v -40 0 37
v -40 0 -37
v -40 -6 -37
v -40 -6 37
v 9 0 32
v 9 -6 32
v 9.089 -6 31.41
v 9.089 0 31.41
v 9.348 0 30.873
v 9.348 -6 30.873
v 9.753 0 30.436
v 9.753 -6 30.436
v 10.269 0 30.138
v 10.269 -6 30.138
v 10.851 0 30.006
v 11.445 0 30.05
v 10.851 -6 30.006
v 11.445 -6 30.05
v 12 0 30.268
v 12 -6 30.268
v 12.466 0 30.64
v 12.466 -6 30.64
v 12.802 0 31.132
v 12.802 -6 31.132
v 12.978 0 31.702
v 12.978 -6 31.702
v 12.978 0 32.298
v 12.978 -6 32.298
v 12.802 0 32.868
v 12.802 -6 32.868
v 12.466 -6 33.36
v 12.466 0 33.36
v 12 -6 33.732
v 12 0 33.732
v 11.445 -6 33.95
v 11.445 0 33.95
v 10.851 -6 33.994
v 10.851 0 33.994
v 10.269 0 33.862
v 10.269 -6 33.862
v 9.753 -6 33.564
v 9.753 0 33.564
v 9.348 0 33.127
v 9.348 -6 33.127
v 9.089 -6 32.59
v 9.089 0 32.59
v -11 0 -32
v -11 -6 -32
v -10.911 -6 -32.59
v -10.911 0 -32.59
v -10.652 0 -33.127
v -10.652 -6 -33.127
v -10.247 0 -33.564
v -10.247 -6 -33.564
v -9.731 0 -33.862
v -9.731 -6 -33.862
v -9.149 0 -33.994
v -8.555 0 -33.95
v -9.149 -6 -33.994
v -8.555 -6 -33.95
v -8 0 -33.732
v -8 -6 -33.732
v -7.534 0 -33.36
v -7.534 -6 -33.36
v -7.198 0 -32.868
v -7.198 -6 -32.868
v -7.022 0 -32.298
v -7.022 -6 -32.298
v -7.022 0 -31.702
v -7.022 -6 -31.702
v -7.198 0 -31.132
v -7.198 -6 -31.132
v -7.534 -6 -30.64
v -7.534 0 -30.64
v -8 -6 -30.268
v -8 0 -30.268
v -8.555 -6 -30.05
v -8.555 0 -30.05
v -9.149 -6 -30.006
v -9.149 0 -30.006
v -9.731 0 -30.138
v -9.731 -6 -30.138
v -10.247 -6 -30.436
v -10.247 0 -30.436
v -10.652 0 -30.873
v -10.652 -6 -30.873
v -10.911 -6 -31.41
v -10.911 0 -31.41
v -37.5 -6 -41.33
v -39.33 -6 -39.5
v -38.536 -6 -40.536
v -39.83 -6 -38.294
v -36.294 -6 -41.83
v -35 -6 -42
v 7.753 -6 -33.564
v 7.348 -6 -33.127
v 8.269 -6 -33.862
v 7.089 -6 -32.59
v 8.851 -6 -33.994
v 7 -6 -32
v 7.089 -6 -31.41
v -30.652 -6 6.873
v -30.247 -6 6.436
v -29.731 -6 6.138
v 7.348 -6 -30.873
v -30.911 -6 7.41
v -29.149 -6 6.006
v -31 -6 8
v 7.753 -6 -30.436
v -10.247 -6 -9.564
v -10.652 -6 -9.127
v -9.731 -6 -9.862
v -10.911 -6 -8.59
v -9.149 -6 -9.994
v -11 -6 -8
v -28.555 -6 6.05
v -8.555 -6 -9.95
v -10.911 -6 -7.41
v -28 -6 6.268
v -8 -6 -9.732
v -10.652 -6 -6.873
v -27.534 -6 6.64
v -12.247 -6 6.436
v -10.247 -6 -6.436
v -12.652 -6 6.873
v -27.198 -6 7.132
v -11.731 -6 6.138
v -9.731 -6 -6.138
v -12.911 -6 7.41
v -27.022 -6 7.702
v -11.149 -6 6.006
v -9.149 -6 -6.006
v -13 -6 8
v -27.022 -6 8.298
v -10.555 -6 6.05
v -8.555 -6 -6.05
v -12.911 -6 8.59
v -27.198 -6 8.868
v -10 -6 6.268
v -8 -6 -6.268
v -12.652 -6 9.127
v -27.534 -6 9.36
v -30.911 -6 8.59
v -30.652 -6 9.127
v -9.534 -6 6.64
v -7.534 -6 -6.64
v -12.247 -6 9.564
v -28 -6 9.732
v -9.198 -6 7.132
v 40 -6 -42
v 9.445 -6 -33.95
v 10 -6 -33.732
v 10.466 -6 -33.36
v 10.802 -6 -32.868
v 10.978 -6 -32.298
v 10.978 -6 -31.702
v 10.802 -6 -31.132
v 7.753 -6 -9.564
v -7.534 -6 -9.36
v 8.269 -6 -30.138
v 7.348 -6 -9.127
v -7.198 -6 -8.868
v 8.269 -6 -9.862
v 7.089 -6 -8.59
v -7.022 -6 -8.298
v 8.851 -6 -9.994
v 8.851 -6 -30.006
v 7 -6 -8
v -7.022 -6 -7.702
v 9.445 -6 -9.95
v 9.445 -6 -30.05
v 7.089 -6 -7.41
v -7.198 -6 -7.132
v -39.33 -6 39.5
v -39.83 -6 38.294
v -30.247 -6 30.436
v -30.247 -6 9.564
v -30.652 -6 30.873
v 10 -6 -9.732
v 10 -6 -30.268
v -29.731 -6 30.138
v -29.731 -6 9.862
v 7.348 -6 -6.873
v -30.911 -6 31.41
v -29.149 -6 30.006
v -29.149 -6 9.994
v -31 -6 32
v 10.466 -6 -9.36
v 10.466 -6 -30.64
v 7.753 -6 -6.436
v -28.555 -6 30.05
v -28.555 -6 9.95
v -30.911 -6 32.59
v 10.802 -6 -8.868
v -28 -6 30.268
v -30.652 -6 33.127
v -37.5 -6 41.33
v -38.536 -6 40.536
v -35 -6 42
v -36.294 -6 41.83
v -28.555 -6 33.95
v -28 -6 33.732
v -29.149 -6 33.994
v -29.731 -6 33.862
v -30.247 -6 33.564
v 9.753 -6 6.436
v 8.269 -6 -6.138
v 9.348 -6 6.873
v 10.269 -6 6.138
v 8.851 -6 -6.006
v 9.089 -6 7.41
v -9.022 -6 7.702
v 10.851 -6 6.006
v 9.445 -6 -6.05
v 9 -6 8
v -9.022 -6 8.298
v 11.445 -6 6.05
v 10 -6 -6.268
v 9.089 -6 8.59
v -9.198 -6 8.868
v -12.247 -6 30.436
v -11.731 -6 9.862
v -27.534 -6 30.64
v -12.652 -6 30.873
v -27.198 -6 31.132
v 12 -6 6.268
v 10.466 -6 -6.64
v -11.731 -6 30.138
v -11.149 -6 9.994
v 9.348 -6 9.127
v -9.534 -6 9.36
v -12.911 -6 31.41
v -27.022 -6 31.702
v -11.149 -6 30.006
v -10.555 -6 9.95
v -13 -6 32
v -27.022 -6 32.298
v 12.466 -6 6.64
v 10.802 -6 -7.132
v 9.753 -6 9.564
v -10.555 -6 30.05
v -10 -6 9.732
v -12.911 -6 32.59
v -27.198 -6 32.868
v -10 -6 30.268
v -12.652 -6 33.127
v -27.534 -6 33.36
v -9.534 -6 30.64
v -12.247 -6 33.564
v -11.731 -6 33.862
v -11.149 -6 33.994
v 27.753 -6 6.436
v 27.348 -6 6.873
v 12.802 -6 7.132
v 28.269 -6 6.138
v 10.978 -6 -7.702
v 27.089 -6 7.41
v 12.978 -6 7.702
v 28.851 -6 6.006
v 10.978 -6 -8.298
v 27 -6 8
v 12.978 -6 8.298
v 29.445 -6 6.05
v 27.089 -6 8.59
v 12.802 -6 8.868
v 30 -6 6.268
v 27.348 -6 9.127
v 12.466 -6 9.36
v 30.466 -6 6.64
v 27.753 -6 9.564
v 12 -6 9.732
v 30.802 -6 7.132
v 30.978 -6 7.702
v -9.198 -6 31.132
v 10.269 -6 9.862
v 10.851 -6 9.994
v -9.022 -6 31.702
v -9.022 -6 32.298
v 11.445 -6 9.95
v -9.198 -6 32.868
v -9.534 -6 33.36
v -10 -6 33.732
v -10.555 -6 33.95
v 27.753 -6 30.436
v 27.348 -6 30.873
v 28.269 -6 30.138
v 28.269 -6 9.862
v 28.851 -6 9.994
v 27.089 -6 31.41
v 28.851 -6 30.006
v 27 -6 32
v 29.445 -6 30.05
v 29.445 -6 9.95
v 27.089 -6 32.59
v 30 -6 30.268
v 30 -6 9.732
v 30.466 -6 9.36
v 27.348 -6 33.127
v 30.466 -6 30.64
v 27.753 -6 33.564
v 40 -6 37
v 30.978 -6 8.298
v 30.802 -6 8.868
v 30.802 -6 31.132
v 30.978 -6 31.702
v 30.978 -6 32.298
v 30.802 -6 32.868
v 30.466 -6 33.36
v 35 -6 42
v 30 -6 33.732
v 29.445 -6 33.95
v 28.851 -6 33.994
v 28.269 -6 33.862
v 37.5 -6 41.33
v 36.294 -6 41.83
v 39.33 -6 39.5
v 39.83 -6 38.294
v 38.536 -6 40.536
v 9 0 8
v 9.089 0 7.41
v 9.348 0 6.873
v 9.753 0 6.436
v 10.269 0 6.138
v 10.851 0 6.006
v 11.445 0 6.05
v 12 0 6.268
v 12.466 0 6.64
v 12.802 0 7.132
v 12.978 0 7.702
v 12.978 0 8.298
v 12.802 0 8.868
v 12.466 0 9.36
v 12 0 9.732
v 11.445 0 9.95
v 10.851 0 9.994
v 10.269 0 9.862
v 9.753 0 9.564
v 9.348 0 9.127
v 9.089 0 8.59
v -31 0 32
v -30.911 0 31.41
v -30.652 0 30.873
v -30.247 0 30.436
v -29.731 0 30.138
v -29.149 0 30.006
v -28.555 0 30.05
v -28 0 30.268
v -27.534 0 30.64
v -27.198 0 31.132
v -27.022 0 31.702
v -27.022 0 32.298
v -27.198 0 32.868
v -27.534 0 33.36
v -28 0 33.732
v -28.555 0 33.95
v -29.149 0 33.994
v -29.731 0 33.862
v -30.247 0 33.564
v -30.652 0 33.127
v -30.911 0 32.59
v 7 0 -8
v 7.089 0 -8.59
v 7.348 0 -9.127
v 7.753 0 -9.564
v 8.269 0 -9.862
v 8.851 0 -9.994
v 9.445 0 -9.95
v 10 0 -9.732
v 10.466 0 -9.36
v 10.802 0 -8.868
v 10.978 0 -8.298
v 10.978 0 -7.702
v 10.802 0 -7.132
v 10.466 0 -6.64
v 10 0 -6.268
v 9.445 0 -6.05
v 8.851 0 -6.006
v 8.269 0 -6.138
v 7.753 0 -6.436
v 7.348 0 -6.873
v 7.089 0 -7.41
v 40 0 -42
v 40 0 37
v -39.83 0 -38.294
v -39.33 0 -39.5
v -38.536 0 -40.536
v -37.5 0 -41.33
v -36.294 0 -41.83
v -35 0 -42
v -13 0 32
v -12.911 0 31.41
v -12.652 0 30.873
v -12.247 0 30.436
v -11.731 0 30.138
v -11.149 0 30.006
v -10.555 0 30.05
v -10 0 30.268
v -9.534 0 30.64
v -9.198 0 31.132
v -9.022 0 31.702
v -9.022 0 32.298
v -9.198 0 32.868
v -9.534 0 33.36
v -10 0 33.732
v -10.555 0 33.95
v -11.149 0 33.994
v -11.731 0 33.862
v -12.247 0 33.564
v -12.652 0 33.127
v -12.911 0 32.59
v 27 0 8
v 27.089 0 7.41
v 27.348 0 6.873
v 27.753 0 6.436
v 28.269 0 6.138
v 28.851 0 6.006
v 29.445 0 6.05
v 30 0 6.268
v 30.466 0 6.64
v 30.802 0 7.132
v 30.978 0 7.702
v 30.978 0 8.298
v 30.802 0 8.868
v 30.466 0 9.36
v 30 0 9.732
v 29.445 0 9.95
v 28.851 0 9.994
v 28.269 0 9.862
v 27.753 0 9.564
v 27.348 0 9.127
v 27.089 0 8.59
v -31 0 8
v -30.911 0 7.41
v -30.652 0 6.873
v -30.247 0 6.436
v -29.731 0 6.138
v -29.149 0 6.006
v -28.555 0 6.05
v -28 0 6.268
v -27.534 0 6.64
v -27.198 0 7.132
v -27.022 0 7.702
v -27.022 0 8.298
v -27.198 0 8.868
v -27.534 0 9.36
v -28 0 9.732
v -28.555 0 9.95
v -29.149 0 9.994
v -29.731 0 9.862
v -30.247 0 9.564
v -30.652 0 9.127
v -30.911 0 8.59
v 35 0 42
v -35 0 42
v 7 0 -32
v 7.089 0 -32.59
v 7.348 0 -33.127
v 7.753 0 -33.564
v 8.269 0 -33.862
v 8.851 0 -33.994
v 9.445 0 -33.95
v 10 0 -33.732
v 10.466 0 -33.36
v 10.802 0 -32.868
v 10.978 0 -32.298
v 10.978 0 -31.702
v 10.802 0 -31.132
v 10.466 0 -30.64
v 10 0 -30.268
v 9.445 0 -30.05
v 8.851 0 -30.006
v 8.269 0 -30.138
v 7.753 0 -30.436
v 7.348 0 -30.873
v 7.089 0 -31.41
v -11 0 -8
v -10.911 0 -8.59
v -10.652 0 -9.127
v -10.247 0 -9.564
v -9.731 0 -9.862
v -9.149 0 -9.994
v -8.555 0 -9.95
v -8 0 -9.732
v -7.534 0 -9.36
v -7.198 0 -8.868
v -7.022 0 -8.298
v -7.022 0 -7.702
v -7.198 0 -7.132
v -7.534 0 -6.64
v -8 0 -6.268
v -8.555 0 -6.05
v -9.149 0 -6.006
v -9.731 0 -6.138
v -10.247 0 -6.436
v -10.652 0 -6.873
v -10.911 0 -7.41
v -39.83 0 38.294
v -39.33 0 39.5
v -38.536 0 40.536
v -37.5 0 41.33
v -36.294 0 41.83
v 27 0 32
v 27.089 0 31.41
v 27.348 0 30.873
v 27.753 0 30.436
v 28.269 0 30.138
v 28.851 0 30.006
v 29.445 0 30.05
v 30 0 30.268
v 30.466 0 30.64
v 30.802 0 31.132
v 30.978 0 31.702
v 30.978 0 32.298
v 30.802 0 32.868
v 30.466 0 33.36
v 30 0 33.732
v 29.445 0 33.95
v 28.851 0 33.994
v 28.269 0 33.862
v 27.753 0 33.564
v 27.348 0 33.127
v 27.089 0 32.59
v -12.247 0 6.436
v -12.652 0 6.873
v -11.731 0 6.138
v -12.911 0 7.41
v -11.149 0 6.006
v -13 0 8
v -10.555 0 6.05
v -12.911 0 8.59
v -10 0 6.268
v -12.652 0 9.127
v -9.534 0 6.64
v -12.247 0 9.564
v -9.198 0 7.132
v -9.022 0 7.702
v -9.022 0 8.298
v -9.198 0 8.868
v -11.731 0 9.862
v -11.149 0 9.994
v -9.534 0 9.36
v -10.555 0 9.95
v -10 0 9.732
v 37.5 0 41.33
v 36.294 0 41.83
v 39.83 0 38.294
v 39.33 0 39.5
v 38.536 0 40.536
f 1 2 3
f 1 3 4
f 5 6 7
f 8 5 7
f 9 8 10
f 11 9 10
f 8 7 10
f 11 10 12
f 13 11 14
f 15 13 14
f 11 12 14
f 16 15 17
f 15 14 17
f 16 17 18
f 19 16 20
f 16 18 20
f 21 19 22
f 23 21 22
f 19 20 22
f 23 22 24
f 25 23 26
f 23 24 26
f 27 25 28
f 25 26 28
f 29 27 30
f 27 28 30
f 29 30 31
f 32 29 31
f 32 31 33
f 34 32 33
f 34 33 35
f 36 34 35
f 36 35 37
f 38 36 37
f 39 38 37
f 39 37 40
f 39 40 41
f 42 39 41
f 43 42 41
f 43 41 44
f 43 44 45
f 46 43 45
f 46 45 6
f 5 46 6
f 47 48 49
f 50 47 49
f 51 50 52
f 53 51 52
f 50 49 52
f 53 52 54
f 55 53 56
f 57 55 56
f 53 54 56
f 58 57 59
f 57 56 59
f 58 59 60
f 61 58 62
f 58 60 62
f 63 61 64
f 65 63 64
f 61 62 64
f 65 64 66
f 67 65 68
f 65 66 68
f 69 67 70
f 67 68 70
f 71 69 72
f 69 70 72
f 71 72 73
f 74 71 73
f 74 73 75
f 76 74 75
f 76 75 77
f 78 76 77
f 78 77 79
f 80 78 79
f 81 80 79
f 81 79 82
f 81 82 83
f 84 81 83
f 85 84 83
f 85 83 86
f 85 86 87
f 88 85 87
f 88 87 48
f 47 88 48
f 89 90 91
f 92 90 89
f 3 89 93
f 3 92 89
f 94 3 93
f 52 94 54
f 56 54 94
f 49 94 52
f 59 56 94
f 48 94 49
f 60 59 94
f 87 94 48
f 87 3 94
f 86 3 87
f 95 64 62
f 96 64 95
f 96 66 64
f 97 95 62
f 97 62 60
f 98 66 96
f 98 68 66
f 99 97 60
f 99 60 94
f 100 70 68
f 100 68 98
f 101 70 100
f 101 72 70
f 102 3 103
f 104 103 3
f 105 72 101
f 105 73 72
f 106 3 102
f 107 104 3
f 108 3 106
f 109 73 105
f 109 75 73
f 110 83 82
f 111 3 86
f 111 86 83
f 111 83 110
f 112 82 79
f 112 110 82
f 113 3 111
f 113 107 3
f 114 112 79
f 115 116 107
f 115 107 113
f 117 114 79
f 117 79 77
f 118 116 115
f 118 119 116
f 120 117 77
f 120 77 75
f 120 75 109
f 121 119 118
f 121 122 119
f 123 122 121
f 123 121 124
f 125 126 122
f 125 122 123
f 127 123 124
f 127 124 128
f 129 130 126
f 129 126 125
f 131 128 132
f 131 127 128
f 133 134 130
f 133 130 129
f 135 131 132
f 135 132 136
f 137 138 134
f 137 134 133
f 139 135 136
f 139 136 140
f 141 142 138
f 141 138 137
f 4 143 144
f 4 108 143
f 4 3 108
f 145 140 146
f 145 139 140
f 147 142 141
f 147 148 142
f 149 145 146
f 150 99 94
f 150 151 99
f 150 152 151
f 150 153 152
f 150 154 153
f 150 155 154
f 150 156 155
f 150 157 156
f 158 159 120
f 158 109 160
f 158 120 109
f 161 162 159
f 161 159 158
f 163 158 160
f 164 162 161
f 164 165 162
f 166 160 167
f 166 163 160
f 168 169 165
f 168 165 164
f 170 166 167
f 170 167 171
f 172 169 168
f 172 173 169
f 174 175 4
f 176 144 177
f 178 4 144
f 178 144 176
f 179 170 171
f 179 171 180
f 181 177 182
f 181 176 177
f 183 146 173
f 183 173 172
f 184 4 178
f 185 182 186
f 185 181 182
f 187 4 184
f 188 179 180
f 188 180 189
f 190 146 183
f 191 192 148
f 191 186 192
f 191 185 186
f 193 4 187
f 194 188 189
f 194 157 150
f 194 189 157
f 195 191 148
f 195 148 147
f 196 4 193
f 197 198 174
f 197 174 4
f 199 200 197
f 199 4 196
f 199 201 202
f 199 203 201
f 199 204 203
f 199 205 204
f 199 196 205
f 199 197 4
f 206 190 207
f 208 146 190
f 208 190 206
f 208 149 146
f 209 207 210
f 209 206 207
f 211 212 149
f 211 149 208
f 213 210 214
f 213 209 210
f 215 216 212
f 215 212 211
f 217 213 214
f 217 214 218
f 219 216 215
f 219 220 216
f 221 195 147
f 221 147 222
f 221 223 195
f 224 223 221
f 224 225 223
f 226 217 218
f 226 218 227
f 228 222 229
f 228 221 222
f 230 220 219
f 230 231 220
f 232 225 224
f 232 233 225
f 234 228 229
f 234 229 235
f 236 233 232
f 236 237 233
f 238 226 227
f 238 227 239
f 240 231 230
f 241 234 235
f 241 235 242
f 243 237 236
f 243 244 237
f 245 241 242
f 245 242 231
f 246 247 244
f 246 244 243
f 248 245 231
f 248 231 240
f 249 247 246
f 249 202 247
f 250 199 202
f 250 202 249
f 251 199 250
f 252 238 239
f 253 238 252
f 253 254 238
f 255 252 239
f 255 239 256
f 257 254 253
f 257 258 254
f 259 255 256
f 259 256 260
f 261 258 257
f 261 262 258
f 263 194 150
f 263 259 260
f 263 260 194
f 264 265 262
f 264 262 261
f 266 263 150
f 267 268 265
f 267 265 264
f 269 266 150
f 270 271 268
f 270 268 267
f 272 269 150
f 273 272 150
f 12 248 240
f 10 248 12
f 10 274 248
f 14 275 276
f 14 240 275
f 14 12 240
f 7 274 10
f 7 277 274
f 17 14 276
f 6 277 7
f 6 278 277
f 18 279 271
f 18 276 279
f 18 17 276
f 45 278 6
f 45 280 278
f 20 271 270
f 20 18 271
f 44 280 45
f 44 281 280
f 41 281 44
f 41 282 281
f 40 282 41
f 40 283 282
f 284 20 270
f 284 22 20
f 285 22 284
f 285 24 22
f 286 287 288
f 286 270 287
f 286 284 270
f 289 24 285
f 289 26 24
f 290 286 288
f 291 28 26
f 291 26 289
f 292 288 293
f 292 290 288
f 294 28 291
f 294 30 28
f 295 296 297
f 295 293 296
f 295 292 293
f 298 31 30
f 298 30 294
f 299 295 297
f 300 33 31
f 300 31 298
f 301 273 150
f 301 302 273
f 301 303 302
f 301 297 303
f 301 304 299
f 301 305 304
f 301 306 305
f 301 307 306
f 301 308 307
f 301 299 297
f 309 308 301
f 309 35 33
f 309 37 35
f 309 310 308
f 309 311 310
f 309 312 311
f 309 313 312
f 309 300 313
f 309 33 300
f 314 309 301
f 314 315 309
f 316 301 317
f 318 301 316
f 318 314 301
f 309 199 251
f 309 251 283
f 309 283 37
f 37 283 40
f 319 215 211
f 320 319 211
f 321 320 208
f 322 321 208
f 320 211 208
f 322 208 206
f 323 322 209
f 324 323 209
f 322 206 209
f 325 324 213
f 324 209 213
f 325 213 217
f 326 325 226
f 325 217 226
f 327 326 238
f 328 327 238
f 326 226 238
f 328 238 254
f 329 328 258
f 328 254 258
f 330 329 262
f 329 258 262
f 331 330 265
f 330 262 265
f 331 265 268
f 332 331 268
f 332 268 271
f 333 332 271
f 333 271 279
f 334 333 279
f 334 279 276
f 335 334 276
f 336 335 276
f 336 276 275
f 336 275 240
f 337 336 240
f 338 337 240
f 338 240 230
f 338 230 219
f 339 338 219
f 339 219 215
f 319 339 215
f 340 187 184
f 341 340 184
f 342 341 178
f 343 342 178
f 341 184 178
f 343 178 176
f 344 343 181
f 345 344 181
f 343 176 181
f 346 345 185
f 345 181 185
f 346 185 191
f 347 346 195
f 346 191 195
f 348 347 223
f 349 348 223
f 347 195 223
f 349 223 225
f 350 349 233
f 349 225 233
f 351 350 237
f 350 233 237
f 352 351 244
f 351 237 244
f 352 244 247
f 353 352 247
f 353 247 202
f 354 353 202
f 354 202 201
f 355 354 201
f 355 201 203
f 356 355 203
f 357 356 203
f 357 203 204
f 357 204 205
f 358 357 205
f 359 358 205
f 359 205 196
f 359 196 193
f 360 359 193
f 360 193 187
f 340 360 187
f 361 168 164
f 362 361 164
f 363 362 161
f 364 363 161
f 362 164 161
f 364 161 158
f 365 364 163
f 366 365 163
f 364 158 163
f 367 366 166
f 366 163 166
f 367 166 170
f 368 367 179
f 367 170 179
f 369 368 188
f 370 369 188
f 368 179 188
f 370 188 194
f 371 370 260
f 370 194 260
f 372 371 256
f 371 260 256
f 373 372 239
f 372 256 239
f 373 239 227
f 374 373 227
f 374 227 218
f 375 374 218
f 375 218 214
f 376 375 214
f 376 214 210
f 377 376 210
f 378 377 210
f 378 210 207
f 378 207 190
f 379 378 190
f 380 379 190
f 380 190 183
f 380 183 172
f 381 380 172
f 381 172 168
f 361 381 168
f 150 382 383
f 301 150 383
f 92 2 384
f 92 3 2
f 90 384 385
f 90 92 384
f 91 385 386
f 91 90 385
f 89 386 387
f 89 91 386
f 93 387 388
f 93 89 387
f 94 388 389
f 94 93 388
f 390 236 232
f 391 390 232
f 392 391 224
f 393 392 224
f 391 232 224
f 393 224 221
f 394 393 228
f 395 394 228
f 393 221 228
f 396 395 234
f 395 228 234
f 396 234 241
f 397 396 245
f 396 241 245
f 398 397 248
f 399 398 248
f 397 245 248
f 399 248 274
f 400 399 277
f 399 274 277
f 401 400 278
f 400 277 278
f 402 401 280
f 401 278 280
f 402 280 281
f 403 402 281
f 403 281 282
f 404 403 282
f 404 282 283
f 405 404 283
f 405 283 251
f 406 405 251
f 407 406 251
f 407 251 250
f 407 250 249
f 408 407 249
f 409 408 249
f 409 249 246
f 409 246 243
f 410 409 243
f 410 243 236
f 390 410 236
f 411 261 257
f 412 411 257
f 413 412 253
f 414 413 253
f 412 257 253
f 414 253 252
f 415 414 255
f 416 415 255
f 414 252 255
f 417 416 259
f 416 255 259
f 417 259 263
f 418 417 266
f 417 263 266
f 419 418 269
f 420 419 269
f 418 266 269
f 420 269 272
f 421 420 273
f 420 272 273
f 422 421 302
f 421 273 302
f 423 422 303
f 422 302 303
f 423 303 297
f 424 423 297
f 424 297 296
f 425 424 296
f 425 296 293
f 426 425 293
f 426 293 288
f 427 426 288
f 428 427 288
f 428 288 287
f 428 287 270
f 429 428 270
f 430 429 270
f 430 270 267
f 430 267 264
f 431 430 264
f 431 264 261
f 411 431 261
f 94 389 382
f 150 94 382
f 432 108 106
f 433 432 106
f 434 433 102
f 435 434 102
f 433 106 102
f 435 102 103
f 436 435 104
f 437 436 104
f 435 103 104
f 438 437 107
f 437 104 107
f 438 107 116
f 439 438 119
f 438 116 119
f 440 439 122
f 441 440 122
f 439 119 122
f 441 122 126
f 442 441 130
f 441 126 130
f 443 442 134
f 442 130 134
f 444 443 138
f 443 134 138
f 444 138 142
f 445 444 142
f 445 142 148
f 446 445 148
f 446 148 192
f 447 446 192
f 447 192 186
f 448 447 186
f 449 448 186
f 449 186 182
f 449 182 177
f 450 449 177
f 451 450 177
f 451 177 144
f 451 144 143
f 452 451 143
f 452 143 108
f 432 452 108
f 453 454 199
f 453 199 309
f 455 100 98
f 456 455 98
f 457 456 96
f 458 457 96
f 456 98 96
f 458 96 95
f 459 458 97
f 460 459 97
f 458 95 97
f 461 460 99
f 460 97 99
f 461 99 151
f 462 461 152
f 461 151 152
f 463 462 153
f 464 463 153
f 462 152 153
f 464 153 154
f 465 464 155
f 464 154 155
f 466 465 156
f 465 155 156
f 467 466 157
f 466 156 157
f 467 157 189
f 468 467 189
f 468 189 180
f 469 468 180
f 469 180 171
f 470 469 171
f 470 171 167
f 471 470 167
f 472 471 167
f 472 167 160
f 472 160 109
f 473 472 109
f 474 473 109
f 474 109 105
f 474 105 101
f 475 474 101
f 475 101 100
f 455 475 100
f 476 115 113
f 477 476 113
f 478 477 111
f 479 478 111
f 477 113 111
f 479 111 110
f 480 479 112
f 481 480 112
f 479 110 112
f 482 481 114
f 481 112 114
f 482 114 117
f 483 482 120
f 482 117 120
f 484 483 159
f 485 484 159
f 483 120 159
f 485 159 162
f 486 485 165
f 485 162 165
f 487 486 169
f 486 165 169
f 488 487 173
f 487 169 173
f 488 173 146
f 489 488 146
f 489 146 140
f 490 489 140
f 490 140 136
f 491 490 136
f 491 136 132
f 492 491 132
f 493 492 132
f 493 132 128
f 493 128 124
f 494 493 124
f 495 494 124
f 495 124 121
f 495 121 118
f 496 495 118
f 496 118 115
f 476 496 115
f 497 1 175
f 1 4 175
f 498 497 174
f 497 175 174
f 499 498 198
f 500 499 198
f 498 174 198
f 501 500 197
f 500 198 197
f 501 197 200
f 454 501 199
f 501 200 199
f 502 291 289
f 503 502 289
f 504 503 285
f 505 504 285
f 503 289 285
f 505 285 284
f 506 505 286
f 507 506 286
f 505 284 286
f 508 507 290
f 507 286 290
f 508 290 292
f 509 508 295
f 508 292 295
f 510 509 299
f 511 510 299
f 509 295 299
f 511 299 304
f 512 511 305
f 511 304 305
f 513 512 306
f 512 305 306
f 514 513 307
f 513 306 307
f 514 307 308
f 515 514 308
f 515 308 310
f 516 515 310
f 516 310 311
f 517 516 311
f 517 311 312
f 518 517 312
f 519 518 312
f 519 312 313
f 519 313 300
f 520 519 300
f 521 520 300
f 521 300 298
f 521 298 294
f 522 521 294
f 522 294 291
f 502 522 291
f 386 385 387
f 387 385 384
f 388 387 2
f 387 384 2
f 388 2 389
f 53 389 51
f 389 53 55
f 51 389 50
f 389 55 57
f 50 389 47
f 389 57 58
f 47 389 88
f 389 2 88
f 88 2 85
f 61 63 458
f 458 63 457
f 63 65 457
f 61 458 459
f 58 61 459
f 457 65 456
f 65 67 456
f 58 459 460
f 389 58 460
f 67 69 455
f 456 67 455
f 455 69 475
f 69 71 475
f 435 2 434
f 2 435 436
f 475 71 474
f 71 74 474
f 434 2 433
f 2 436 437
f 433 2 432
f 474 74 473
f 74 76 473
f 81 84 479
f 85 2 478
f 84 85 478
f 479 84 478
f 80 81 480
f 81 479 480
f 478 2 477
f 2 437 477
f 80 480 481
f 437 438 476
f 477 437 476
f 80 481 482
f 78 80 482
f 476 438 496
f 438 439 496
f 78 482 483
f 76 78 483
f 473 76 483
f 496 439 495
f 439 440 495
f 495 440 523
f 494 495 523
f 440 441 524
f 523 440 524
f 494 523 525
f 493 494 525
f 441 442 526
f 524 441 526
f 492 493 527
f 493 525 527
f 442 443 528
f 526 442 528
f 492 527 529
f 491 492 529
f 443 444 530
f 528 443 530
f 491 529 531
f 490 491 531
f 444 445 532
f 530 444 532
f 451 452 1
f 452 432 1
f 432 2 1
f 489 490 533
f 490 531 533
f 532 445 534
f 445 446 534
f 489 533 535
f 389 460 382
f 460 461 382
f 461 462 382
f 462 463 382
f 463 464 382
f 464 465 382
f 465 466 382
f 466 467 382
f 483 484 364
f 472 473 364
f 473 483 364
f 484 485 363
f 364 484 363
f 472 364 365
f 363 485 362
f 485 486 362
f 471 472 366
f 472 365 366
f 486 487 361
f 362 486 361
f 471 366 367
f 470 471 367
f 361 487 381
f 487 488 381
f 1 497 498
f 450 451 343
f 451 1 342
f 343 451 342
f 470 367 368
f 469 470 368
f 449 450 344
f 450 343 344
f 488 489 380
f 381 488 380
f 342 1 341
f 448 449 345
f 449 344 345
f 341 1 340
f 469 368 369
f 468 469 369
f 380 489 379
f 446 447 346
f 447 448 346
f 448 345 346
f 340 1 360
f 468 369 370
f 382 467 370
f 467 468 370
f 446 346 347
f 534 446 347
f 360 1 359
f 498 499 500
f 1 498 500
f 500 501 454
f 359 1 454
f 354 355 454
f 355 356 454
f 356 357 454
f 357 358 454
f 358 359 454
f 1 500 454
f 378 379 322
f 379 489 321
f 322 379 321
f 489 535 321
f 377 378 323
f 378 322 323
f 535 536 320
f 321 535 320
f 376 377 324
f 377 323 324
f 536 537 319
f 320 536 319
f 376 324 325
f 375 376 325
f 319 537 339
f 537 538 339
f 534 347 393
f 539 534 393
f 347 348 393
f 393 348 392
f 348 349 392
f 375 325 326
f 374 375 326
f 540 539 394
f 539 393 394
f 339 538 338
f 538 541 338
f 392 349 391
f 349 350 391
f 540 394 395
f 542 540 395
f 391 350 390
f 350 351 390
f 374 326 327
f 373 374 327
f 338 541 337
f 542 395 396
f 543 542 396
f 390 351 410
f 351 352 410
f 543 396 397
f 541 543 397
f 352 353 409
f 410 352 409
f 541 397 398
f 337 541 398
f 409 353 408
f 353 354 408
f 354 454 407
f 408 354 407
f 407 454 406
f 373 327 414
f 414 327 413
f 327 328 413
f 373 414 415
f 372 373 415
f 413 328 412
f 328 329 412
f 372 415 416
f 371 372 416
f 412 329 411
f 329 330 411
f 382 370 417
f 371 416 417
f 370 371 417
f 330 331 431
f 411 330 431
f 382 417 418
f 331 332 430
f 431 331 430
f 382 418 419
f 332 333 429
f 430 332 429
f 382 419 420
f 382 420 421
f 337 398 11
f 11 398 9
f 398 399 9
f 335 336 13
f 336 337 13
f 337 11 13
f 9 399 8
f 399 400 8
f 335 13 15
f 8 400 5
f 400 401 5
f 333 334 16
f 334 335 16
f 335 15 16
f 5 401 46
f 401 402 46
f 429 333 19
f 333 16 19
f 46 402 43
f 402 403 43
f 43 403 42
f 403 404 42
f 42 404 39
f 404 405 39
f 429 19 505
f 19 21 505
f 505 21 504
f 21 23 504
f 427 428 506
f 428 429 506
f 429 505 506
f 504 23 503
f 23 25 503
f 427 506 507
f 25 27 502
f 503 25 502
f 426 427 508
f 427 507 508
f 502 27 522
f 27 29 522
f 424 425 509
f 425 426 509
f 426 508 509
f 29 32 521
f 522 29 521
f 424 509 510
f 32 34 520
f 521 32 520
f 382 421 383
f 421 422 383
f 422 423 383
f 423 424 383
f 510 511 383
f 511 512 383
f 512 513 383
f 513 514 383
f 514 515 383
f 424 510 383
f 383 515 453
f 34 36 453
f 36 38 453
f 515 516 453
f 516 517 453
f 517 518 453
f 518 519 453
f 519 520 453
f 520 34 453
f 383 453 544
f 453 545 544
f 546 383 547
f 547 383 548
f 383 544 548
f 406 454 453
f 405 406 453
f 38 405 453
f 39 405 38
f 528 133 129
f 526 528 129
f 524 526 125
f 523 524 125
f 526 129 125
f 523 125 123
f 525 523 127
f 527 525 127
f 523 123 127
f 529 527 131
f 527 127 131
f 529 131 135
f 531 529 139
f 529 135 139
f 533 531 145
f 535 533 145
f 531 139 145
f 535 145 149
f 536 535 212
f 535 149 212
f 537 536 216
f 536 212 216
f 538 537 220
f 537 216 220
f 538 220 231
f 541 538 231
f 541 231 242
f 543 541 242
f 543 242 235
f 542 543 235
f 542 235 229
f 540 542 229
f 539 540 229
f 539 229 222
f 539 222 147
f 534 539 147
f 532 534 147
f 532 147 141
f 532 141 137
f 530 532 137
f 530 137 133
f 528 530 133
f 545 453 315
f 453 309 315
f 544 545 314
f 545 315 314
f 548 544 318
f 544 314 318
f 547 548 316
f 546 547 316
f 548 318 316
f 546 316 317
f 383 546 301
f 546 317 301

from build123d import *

# Parameters (mm, degrees)
F0_W     = 80
F0_H     = 84
F0_W_2   = 30
F0_H_2   = 34
F0_W_3   = 18
F0_H_3   = 24
F1_DEPTH = 6
F2_D     = 4
F3_R     = 5


with BuildPart() as f1:
    # F0 (on Front) → F1 (new body)
    with BuildSketch(Plane.XZ):
        Rectangle(F0_W, F0_H)
        with Locations((0, -20)):
            Rectangle(F0_W_2, F0_H_2, mode=Mode.SUBTRACT)
        with Locations((-20, 20)):
            Rectangle(F0_W_2, F0_H_2, mode=Mode.SUBTRACT)
        with Locations((20, 20)):
            Rectangle(F0_W_2, F0_H_2, mode=Mode.SUBTRACT)
        with Locations((-20, 20)):
            Rectangle(F0_W_2, F0_H_2)
        with Locations((-20, 20)):
            Rectangle(F0_W_3, F0_H_3, mode=Mode.SUBTRACT)
        with Locations((20, 20)):
            Rectangle(F0_W_2, F0_H_2)
        with Locations((20, 20)):
            Rectangle(F0_W_3, F0_H_3, mode=Mode.SUBTRACT)
        with Locations((0, -20)):
            Rectangle(F0_W_2, F0_H_2)
        with Locations((0, -20)):
            Rectangle(F0_W_3, F0_H_3, mode=Mode.SUBTRACT)
        with Locations((-20, 20)):
            Rectangle(F0_W_3, F0_H_3)
        with Locations((20, 20)):
            Rectangle(F0_W_3, F0_H_3)
        with Locations((0, -20)):
            Rectangle(F0_W_3, F0_H_3)
    extrude(amount=F1_DEPTH)

    # F2 (through all)
    with Locations(Plane(origin=(0, 0, 0), x_dir=(1, 0, 0), z_dir=(0, 1, 0))):
        with Locations((-29, -32), (-11, -32), (-29, -8), (-11, -8), (11, -32), (29, -32), (29, -8), (11, -8), (9, 8), (-9, 8), (-9, 32), (9, 32)):
            Hole(F2_D / 2)

    # F3
    f3_edges = [f1.edges().sort_by_distance(p)[0] for p in [
        (-40, -3, 42),
        (-40, -3, -42),
        (40, -3, 42),
    ]]
    fillet(f3_edges, radius=F3_R)


solid = f1.part
